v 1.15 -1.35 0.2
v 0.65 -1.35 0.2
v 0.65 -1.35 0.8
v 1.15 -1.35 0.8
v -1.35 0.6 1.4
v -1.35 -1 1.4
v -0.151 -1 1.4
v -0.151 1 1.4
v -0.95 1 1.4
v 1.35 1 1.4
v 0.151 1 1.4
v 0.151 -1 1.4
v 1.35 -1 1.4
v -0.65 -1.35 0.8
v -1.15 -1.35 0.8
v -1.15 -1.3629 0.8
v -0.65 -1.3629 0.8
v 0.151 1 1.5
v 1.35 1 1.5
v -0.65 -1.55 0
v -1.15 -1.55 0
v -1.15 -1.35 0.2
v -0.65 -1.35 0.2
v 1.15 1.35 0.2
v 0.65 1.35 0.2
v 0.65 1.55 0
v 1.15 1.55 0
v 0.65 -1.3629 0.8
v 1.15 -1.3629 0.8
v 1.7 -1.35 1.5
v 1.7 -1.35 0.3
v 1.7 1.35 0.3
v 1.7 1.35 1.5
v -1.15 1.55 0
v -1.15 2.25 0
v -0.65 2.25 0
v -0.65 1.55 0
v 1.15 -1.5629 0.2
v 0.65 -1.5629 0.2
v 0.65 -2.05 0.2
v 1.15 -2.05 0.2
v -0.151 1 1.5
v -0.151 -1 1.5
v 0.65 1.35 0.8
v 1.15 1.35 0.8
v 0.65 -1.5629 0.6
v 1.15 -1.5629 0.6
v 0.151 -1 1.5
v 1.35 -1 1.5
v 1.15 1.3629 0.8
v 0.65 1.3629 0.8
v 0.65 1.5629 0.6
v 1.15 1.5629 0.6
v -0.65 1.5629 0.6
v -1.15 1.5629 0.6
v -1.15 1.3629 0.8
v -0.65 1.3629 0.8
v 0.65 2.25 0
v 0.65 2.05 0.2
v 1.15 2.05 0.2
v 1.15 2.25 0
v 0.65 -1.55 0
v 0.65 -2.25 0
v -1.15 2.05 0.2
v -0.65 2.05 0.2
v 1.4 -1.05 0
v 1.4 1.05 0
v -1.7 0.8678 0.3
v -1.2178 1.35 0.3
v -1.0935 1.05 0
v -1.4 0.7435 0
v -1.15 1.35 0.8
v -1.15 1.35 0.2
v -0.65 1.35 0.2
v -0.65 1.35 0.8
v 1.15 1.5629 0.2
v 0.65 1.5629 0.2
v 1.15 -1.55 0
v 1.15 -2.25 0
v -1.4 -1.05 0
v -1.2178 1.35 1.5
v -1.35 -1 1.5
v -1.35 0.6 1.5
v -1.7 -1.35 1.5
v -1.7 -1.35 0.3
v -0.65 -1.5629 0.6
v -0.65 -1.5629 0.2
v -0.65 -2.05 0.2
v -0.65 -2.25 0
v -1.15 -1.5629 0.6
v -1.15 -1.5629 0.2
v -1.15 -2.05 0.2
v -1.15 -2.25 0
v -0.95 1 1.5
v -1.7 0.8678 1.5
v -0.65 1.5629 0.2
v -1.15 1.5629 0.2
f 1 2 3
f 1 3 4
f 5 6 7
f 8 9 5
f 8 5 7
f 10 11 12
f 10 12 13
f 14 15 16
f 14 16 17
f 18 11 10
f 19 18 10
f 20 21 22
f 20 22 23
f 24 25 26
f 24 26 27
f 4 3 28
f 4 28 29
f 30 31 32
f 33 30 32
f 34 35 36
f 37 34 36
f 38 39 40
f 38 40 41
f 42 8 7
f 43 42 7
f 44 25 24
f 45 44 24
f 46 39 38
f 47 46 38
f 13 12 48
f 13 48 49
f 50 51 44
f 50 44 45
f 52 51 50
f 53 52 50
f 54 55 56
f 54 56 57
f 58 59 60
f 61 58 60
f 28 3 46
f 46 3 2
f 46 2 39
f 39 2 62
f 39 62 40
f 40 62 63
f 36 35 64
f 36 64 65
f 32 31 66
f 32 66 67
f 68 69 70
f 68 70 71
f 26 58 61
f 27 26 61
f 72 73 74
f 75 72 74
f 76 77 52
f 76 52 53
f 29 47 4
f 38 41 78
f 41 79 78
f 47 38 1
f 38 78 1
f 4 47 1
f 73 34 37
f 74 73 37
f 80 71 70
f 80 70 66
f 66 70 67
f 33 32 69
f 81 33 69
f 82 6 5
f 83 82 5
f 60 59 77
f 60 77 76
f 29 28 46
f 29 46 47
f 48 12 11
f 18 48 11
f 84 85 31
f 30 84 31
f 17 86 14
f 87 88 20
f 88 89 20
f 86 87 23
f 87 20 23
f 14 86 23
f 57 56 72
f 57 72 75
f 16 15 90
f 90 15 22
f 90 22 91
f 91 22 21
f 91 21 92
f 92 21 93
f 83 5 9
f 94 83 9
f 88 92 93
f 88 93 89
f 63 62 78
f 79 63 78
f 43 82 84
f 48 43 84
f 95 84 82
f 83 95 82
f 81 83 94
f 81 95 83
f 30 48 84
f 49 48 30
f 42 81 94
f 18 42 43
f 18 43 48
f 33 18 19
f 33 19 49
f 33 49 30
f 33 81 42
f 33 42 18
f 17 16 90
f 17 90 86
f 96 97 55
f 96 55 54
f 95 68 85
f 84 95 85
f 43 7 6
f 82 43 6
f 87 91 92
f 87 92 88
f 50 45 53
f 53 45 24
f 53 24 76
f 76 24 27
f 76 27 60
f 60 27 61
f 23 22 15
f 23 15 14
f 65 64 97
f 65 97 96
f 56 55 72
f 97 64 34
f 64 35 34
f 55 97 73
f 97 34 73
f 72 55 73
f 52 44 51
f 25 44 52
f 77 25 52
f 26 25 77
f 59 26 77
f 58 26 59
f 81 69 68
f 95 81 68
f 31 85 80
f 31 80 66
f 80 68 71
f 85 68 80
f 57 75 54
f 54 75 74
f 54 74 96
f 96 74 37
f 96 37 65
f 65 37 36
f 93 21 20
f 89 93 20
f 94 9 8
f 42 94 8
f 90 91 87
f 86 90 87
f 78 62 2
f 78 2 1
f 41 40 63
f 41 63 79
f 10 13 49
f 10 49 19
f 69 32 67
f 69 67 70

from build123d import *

# Parameters (mm, degrees)
F0_W      = 1.1990487342
F0_H      = 2
F1_DEPTH  = 1.5
F2_DEPTH  = 1.4
F3_SIZE   = 0.3
F0_W_2    = 0.5
F0_H_2    = 0.6870733146
F0_H_3    = 0.2129266854
F4_DEPTH  = 0.2
F5_DEPTH  = 0.8
F6_SIZE   = 0.19999
F6_2_SIZE = 0.19999
F6_3_SIZE = 0.19999
F6_4_SIZE = 0.19999


# Not quite as in the source:
# - a fillet or chamfer is up to 0.001 mm smaller than in the source, because OpenCascade refuses the exact size


with BuildPart() as f1:
    # F0 (on Top) → F1 (new body)
    with BuildSketch(Plane.XY):
        Polygon((1.7, -1.35), (1.7, 1.35), (1.15, 1.35), (0.65, 1.35), (-0.65, 1.35), (-1.15, 1.35), (-1.2177615426, 1.35), (-1.7, 0.8677615426), (-1.7, -1.35), (-1.15, -1.35), (-0.65, -1.35), (0.65, -1.35), (1.15, -1.35), align=None)
        Polygon((-1.35, -1), (-1.35, 0.6), (-0.95, 1), (-0.1509512658, 1), (-0.1509512658, -1), align=None, mode=Mode.SUBTRACT)
        with Locations((0.7504756329, 0)):
            Rectangle(F0_W, F0_H, mode=Mode.SUBTRACT)
    extrude(amount=F1_DEPTH)

    # F0 (on Top) → F2 (join)
    with BuildSketch(Plane.XY):
        Polygon((-0.95, 1), (-1.35, 0.6), (-1.35, -1), (-0.1509512658, -1), (-0.1509512658, 1), align=None)
        with Locations((0.7504756329, 0)):
            Rectangle(F0_W, F0_H)
    extrude(amount=F2_DEPTH)

    # F3
    f3_edges = [f1.edges().sort_by_distance(p)[0] for p in [
        (-1.7, -0.241119, 0),
        (-1.458881, 1.108881, 0),
        (0.241119, 1.35, 0),
        (0, -1.35, 0),
        (1.7, 0, 0),
    ]]
    chamfer(f3_edges, length=F3_SIZE)


with BuildPart() as f4:
    # F0 (on Top) → F4 (new body)
    with BuildSketch(Plane.XY):
        with Locations((-0.9, 1.9064633427)):
            Rectangle(F0_W_2, F0_H_2)
        with Locations((-0.9, 1.4564633427)):
            Rectangle(F0_W_2, F0_H_3)
    extrude(amount=F4_DEPTH)

    # F0 (on Top) → F5, piece 2 (join)
    with BuildSketch(Plane.XY):
        with Locations((-0.9, 1.4564633427)):
            Rectangle(F0_W_2, F0_H_3)
    extrude(amount=F5_DEPTH)

    # F6 (size 0.2 in the source; OpenCascade refuses exactly that, so slightly less here)
    f6_edges = [f4.edges().sort_by_distance(p)[0] for p in [
        (-0.9, 2.25, 0.2),
        (-0.9, 1.35, 0),
        (-0.9, 1.562927, 0.8),
    ]]
    chamfer(f6_edges, length=F6_SIZE)


with BuildPart() as f4b:
    # F0 (on Top) → F4, piece 2 (new body)
    with BuildSketch(Plane.XY):
        with Locations((0.9, 1.9064633427)):
            Rectangle(F0_W_2, F0_H_2)
    extrude(amount=F4_DEPTH)

    # F0 (on Top) → F5 (join)
    with BuildSketch(Plane.XY):
        with Locations((0.9, 1.4564633427)):
            Rectangle(F0_W_2, F0_H_3)
    extrude(amount=F5_DEPTH)

    # F6#2 (size 0.2 in the source; OpenCascade refuses exactly that, so slightly less here)
    f6_2_edges = [f4b.edges().sort_by_distance(p)[0] for p in [
        (0.9, 1.35, 0),
        (0.9, 2.25, 0.2),
        (0.9, 1.562927, 0.8),
    ]]
    chamfer(f6_2_edges, length=F6_2_SIZE)


with BuildPart() as f4c:
    # F0 (on Top) → F4, piece 3 (new body)
    with BuildSketch(Plane.XY):
        with Locations((-0.9, -1.9064633427)):
            Rectangle(F0_W_2, F0_H_2)
        with Locations((-0.9, -1.4564633427)):
            Rectangle(F0_W_2, F0_H_3)
    extrude(amount=F4_DEPTH)

    # F0 (on Top) → F5, piece 3 (join)
    with BuildSketch(Plane.XY):
        with Locations((-0.9, -1.4564633427)):
            Rectangle(F0_W_2, F0_H_3)
    extrude(amount=F5_DEPTH)

    # F6#3 (size 0.2 in the source; OpenCascade refuses exactly that, so slightly less here)
    f6_3_edges = [f4c.edges().sort_by_distance(p)[0] for p in [
        (-0.9, -2.25, 0.2),
        (-0.9, -1.35, 0),
        (-0.9, -1.562927, 0.8),
    ]]
    chamfer(f6_3_edges, length=F6_3_SIZE)


with BuildPart() as f4d:
    # F0 (on Top) → F4, piece 4 (new body)
    with BuildSketch(Plane.XY):
        with Locations((0.9, -1.9064633427)):
            Rectangle(F0_W_2, F0_H_2)
        with Locations((0.9, -1.4564633427)):
            Rectangle(F0_W_2, F0_H_3)
    extrude(amount=F4_DEPTH)

    # F0 (on Top) → F5, piece 4 (join)
    with BuildSketch(Plane.XY):
        with Locations((0.9, -1.4564633427)):
            Rectangle(F0_W_2, F0_H_3)
    extrude(amount=F5_DEPTH)

    # F6#4 (size 0.2 in the source; OpenCascade refuses exactly that, so slightly less here)
    f6_4_edges = [f4d.edges().sort_by_distance(p)[0] for p in [
        (0.9, -2.25, 0.2),
        (0.9, -1.35, 0),
        (0.9, -1.562927, 0.8),
    ]]
    chamfer(f6_4_edges, length=F6_4_SIZE)


solid = Compound([f1.part, f4.part, f4b.part, f4c.part, f4d.part])
